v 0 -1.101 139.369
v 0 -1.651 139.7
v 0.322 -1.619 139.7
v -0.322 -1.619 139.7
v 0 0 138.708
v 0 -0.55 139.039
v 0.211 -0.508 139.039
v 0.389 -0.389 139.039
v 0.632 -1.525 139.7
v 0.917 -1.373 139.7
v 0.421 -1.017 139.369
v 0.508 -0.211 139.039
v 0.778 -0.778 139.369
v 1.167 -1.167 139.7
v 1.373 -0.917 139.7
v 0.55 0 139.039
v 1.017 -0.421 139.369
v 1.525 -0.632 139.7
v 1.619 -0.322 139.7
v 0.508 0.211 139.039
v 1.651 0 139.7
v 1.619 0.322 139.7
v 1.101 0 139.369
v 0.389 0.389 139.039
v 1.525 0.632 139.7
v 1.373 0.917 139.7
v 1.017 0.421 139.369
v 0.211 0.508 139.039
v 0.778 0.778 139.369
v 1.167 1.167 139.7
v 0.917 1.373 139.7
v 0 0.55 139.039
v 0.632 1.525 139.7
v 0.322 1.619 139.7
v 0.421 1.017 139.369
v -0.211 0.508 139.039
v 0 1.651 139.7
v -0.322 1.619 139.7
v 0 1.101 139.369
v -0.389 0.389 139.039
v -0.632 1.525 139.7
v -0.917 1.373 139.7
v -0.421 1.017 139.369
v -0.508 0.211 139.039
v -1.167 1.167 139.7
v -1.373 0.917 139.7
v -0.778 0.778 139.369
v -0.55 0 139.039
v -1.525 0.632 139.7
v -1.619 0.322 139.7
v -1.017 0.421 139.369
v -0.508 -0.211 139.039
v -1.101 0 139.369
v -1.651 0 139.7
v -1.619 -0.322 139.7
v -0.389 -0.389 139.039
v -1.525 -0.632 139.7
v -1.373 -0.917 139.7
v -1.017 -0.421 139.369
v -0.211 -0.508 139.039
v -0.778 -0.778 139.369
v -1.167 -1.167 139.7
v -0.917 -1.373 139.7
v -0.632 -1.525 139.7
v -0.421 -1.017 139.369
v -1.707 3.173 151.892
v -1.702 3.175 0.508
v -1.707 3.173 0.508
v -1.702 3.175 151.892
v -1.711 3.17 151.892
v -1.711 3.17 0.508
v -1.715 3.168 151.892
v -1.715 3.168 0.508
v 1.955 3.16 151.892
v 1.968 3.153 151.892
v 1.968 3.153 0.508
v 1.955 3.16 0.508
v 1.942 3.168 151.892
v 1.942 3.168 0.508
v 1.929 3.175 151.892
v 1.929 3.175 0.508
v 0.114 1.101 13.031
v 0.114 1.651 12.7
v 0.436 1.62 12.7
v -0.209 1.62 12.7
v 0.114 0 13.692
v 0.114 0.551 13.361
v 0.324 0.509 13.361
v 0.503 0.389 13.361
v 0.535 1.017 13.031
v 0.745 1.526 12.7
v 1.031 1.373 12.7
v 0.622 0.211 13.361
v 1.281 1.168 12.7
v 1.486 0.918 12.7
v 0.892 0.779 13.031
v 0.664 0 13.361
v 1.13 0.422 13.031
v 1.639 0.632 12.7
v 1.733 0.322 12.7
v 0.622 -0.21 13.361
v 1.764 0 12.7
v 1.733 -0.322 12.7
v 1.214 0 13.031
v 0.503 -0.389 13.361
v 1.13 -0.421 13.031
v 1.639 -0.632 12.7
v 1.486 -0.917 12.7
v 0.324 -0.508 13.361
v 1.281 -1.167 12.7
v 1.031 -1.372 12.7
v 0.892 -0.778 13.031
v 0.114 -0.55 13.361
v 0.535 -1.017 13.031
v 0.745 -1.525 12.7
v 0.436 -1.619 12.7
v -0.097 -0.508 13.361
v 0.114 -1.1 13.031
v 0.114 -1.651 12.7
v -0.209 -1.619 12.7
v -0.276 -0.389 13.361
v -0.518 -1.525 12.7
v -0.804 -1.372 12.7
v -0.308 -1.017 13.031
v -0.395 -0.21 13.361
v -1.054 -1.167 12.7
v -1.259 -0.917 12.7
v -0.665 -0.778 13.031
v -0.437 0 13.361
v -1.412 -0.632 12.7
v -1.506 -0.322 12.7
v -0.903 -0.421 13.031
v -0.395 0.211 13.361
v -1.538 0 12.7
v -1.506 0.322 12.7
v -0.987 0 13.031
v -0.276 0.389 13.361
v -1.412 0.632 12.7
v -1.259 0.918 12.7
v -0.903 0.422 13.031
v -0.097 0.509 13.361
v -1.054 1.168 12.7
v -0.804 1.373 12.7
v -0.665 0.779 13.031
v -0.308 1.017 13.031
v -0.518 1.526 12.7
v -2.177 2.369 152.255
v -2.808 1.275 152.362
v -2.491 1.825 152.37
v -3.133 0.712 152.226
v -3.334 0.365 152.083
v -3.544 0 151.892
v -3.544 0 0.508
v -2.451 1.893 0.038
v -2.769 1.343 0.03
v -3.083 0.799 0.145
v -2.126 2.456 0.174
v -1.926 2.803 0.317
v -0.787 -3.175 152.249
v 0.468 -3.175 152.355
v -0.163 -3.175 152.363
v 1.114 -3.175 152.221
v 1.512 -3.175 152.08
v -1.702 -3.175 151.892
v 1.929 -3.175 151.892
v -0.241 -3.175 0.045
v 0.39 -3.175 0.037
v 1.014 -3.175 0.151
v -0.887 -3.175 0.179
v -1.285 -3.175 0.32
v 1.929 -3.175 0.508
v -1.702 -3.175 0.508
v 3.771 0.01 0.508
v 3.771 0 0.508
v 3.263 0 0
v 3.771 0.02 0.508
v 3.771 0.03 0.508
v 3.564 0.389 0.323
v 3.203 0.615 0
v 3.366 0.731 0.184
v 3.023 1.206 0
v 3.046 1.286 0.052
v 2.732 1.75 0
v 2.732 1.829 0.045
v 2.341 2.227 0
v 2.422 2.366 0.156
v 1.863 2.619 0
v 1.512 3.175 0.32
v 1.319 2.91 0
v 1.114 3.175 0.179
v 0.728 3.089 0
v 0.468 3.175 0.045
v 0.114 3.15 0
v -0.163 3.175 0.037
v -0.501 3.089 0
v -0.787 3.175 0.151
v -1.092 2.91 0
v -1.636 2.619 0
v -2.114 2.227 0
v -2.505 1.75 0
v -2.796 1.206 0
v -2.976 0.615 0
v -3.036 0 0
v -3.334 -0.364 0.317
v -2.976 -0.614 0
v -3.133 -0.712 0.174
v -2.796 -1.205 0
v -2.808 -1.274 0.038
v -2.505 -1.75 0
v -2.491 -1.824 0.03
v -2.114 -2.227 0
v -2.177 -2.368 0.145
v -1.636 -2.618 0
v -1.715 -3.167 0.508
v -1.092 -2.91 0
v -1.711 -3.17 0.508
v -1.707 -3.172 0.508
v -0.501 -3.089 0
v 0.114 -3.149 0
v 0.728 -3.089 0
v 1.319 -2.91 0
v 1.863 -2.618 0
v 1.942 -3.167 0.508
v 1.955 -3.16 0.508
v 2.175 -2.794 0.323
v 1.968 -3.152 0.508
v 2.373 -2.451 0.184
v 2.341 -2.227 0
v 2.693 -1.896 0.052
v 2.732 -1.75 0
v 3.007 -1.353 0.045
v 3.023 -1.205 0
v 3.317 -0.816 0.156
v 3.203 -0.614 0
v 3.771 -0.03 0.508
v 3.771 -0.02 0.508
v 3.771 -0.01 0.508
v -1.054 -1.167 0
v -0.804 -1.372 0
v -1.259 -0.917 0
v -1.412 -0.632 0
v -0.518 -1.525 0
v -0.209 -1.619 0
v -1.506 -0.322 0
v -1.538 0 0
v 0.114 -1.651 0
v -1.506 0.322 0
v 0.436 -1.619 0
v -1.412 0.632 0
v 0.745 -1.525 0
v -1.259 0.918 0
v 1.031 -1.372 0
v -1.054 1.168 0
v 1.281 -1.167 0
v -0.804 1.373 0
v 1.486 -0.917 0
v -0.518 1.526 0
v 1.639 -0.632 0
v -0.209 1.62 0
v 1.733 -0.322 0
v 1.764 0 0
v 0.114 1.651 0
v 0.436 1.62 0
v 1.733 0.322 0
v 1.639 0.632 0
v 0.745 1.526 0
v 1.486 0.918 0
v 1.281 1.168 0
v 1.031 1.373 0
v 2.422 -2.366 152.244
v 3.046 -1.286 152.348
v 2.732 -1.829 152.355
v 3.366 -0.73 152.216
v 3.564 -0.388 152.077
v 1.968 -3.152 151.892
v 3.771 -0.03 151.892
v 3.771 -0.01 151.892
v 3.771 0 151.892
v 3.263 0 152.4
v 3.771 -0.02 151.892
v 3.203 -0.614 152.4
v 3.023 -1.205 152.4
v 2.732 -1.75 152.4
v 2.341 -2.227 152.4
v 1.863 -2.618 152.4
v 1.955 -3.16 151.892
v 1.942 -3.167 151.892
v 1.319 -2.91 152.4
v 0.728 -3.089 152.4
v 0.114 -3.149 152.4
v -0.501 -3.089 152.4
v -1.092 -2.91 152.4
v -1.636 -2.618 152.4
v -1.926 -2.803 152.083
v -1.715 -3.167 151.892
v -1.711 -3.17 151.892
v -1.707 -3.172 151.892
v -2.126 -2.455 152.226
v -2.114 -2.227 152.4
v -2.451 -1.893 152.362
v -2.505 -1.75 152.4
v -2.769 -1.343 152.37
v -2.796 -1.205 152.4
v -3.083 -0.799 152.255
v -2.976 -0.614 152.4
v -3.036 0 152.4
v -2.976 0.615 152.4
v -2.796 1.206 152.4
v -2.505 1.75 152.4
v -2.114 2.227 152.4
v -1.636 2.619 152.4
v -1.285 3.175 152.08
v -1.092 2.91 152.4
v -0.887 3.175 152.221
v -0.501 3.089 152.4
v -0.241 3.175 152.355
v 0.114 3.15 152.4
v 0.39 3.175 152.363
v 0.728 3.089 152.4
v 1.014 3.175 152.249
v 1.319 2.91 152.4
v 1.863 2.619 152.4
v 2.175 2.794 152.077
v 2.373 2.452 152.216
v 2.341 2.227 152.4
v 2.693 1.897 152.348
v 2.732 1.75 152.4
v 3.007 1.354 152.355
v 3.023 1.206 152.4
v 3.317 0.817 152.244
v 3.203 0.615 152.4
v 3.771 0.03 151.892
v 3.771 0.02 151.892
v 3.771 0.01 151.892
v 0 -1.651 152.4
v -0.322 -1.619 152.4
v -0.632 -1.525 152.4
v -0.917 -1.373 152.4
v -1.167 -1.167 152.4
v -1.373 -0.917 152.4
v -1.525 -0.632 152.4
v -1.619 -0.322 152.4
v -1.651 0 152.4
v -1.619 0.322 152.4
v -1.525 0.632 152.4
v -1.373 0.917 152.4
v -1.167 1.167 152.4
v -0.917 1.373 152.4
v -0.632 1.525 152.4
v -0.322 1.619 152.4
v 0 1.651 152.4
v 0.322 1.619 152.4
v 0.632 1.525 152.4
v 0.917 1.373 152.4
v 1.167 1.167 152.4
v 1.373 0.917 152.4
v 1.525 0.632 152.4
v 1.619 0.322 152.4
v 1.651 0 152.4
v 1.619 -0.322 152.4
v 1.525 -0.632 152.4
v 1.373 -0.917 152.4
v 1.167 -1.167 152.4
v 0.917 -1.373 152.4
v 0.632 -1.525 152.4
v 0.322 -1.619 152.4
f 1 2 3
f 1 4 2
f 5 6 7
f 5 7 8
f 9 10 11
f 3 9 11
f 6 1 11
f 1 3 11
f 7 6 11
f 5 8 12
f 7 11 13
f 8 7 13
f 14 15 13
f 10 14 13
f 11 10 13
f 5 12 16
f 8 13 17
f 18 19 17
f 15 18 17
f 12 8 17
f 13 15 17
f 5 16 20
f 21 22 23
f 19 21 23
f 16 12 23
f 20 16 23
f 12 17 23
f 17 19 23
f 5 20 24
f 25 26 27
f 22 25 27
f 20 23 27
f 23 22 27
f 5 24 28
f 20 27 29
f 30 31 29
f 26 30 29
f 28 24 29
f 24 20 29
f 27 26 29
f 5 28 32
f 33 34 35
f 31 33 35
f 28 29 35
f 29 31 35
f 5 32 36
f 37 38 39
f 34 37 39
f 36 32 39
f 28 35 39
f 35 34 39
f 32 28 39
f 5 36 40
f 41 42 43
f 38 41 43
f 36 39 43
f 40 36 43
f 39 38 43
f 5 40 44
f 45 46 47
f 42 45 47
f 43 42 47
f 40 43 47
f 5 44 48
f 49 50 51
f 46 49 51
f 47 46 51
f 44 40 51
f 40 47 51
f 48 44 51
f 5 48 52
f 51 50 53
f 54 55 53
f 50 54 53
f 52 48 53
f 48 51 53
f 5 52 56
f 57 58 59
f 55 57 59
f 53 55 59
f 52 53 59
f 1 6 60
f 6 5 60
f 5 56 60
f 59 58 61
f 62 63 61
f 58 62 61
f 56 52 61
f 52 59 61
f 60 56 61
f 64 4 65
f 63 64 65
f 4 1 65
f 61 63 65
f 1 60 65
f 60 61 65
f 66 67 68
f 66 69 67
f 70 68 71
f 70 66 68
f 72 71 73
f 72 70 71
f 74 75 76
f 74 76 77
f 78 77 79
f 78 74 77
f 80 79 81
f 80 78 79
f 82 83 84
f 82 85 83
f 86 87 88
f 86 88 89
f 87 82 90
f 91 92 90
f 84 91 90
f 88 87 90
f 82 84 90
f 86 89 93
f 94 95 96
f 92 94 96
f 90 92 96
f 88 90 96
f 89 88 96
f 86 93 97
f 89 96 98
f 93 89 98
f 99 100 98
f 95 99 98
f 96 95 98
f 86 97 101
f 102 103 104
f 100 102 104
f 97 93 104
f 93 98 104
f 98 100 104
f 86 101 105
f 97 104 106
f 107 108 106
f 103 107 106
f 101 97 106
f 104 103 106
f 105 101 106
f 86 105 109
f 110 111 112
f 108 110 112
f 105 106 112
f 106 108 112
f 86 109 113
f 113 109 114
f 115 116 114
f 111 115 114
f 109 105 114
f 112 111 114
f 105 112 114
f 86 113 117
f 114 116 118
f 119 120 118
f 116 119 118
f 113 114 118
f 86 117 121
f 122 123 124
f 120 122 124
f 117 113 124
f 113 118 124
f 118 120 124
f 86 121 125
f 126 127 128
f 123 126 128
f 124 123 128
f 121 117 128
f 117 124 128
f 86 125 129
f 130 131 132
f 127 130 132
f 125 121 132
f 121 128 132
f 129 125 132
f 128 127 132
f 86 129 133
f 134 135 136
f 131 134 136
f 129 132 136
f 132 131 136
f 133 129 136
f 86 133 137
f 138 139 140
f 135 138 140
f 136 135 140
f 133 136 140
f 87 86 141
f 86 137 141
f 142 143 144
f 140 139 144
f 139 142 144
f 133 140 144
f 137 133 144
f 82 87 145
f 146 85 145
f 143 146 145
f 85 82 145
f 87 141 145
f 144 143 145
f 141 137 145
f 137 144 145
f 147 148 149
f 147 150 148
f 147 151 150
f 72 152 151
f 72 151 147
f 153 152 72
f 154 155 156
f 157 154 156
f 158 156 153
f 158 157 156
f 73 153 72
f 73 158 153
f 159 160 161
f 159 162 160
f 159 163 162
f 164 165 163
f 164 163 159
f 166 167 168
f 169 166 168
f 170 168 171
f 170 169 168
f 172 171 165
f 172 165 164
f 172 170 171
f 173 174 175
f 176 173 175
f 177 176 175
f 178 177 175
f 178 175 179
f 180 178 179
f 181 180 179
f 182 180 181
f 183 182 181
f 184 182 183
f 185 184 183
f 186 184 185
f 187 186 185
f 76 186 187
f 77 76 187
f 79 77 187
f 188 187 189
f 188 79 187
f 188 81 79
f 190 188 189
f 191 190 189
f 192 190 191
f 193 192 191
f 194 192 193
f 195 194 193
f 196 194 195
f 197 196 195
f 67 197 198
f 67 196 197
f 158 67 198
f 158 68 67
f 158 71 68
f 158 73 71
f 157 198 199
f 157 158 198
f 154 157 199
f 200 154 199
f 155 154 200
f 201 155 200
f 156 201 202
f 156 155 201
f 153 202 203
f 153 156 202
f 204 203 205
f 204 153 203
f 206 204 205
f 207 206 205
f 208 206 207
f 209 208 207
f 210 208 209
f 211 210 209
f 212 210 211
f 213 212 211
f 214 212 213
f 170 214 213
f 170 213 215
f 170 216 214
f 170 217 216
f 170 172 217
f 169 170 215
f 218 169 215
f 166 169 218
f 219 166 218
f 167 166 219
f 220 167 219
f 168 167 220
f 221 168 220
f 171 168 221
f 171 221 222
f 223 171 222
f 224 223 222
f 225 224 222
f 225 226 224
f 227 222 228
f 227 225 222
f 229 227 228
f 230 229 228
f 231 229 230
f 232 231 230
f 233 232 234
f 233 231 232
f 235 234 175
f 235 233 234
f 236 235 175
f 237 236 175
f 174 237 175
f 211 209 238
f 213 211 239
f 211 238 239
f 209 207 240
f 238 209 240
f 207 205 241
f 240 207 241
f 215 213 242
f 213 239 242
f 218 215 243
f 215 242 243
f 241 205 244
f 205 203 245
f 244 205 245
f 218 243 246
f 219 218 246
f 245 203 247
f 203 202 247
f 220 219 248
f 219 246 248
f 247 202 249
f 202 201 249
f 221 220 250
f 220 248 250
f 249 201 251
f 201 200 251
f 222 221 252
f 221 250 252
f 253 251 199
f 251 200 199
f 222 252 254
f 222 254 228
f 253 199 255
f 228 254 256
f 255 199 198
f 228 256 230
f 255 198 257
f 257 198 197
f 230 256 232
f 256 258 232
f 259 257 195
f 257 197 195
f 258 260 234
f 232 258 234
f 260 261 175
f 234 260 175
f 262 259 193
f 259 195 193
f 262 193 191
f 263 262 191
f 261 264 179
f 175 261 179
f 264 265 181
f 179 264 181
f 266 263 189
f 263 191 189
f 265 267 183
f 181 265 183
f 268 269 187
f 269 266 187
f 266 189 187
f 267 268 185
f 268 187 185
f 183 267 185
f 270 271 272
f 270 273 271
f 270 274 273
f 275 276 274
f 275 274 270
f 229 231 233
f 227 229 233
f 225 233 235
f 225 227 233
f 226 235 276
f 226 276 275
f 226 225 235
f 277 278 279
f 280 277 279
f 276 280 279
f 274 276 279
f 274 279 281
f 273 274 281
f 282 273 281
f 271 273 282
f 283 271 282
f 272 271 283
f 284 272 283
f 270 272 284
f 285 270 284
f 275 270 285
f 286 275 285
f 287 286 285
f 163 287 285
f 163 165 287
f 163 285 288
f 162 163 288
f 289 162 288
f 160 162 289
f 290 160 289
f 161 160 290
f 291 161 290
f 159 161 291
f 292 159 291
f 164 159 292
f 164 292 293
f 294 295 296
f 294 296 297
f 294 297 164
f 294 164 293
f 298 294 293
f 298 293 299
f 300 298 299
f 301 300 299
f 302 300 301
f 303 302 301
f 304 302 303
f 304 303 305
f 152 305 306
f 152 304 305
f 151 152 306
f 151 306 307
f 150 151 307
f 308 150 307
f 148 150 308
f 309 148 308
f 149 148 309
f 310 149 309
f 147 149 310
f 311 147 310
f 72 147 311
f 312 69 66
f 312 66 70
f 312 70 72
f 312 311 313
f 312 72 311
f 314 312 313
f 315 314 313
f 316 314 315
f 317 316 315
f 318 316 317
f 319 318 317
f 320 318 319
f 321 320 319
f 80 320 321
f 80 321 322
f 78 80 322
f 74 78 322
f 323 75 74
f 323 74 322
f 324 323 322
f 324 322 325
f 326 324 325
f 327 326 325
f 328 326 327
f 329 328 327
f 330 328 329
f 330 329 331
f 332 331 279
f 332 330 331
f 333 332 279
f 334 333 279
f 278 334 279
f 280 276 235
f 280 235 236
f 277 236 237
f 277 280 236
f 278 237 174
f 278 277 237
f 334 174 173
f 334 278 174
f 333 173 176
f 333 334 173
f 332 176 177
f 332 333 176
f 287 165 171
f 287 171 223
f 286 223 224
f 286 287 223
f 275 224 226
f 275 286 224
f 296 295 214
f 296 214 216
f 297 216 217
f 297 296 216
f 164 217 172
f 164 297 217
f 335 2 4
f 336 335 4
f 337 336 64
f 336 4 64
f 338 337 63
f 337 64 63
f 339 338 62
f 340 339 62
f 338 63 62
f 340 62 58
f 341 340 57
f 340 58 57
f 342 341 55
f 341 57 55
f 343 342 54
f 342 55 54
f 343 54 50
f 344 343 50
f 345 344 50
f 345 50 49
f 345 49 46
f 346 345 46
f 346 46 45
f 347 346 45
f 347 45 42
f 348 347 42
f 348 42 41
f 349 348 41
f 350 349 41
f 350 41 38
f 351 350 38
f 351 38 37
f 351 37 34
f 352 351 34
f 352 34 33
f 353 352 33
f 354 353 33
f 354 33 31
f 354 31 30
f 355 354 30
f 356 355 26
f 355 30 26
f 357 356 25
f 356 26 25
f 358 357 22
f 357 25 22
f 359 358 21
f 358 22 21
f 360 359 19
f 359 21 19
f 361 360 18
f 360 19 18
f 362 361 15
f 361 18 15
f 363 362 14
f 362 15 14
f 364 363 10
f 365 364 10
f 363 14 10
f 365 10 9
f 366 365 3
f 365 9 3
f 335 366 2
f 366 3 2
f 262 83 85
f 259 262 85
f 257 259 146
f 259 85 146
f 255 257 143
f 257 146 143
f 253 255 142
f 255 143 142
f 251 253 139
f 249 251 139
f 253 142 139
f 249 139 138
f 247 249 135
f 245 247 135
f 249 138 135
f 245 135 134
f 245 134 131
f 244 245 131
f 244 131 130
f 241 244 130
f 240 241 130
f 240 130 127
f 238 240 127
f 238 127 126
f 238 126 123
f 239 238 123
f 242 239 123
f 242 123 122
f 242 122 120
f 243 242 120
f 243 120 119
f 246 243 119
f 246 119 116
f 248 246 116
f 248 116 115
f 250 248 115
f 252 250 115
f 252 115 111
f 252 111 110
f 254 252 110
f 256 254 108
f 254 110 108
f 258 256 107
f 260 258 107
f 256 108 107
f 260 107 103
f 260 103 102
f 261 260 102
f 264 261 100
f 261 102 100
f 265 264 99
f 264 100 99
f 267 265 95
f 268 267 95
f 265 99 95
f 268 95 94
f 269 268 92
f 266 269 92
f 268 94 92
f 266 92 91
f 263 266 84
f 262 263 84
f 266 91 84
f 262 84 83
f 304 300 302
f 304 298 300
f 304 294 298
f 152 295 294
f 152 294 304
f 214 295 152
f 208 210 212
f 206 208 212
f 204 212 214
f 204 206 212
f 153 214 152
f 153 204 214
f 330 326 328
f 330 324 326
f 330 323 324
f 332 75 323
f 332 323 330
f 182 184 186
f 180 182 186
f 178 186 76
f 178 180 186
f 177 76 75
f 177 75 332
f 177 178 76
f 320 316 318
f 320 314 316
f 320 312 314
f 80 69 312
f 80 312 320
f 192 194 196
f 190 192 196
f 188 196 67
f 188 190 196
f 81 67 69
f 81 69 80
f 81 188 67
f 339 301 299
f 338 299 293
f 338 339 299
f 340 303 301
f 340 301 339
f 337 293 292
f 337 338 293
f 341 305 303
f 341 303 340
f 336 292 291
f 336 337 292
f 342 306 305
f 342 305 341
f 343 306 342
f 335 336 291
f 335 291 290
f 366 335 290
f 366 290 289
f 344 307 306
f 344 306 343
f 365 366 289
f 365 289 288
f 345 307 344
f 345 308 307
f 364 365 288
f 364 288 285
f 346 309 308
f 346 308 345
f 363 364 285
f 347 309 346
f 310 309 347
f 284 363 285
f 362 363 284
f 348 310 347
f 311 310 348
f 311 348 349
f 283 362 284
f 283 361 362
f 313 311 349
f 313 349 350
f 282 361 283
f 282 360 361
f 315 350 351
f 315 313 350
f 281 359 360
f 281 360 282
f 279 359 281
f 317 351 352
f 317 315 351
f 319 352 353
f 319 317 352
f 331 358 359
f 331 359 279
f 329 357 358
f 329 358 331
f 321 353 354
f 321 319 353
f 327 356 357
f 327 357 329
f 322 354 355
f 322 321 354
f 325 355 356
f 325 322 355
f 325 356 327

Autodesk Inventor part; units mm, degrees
ref_plane "YZ Plane" through (0, 0, 0) normal (1, 0, 0) x (0, 1, 0)
sketch "Sketch1" plane through (0, 0, 0) normal (0, 0, 1) x (1, 0, 0)
  line L0 (1.9552, -3.1747) -> (-1.711, -3.1747)
  line L1 (-1.711, -3.1747) -> (-3.5441, 0.0003)
  line L2 (-3.5441, 0.0003) -> (-1.711, 3.1753)
  line L3 (-1.711, 3.1753) -> (1.9552, 3.1753)
  line L4 (1.9552, 3.1753) -> (3.7883, 0.0003)
  line L5 (3.7883, 0.0003) -> (1.9552, -3.1747)
  point P0 (0.1221, 0.0003)
  dimension "d0" = 6.35
extrude "Extrusion1" add sketch "Sketch1" along normal blind 152.4
ref_plane "Work Plane1" through (-1.711, 0.0003, 0) normal (0, 1, 0) x (1, 0, 0)
sketch "Sketch3" plane through (-1.711, 0.0003, 0) normal (0, 1, 0) x (1, 0, 0)
  line L0 (-1.3251, 0) -> (4.9741, 0)
  line L1 (5.4821, -0.508) -> (5.4821, -151.892)
  line L2 (-1.8331, -151.892) -> (-1.8331, -0.508)
  line L3 (-1.8331, -0.508) -> (-1.3251, 0)
  line L4 (4.9741, 0) -> (5.4821, -0.508)
  line L5 (-1.8331, 0) -> (-1.8331, -152.4) projected
  line L6 (3.6662, 0) -> (5.4993, 0) projected
  line L7 (1.8245, 0) -> (1.8245, -152.4)
  line L8 (0, -152.4) -> (-1.8331, -152.4) projected
  line L9 (5.4993, -152.4) -> (3.6662, -152.4) projected
  line L10 (3.6662, -152.4) -> (0, -152.4) projected
  line L11 (-1.3251, -152.4) -> (-1.8331, -151.892)
  line L12 (4.9741, -152.4) -> (5.4821, -151.892)
  point P0 (-1.8331, 0)
  point P1 (5.4821, 0)
  point P2 (5.4821, -152.4)
  dimension "d5" = 0.508
  dimension "d6" = 0.508
  dimension "d7" = 0.508
  dimension "d8" = 0.508
  dimension "d16" = 0
  dimension "d46" = 0.508
  dimension "d47" = 0.508
  dimension "d48" = 0.508
  dimension "d49" = 0.508
revolve "Revolution1" cut sketch "Sketch3" angle 360 about axis through (0.1135, 0.0003, 0) along (0, 0, 1) keep common part contours L0 L4 L1 L12 L9 L10 L7
sketch "Sketch6" plane through (0.1135, 0.0003, 0) normal (0, 0, -1) x (-1, 0, 0)
  circle A0 centre (0, 0) radius 3.1496 projected
hole "Hole3" at (0.1135, 0.0003, 0) direction (0, 0, 1) diameter 3.302 depth 12.7 tip angle 118 thread size "8-32 UNC" class "2B" standard "ANSI Unified Screw Threads"
sketch "Sketch7" plane through (0, 0, 152.4) normal (0, 0, 1) x (1, 0, 0)
  point P0 (0, 0)
hole "Hole4" at (0, 0, 152.4) direction (0, 0, -1) diameter 3.302 depth 12.7 tip angle 118 thread size "8-32 UNC" class "2B" standard "ANSI Unified Screw Threads"
ref_plane "Work Plane2" through (0.1135, 0.0003, 76.2) normal (0, 0, -1) x (-1, 0, 0)
equation "\"d6\" = d5"
equation "\"d7\" = d5"
equation "\"d8\" = d7"
properties part number "6 inch Standoff" material "Steel"
